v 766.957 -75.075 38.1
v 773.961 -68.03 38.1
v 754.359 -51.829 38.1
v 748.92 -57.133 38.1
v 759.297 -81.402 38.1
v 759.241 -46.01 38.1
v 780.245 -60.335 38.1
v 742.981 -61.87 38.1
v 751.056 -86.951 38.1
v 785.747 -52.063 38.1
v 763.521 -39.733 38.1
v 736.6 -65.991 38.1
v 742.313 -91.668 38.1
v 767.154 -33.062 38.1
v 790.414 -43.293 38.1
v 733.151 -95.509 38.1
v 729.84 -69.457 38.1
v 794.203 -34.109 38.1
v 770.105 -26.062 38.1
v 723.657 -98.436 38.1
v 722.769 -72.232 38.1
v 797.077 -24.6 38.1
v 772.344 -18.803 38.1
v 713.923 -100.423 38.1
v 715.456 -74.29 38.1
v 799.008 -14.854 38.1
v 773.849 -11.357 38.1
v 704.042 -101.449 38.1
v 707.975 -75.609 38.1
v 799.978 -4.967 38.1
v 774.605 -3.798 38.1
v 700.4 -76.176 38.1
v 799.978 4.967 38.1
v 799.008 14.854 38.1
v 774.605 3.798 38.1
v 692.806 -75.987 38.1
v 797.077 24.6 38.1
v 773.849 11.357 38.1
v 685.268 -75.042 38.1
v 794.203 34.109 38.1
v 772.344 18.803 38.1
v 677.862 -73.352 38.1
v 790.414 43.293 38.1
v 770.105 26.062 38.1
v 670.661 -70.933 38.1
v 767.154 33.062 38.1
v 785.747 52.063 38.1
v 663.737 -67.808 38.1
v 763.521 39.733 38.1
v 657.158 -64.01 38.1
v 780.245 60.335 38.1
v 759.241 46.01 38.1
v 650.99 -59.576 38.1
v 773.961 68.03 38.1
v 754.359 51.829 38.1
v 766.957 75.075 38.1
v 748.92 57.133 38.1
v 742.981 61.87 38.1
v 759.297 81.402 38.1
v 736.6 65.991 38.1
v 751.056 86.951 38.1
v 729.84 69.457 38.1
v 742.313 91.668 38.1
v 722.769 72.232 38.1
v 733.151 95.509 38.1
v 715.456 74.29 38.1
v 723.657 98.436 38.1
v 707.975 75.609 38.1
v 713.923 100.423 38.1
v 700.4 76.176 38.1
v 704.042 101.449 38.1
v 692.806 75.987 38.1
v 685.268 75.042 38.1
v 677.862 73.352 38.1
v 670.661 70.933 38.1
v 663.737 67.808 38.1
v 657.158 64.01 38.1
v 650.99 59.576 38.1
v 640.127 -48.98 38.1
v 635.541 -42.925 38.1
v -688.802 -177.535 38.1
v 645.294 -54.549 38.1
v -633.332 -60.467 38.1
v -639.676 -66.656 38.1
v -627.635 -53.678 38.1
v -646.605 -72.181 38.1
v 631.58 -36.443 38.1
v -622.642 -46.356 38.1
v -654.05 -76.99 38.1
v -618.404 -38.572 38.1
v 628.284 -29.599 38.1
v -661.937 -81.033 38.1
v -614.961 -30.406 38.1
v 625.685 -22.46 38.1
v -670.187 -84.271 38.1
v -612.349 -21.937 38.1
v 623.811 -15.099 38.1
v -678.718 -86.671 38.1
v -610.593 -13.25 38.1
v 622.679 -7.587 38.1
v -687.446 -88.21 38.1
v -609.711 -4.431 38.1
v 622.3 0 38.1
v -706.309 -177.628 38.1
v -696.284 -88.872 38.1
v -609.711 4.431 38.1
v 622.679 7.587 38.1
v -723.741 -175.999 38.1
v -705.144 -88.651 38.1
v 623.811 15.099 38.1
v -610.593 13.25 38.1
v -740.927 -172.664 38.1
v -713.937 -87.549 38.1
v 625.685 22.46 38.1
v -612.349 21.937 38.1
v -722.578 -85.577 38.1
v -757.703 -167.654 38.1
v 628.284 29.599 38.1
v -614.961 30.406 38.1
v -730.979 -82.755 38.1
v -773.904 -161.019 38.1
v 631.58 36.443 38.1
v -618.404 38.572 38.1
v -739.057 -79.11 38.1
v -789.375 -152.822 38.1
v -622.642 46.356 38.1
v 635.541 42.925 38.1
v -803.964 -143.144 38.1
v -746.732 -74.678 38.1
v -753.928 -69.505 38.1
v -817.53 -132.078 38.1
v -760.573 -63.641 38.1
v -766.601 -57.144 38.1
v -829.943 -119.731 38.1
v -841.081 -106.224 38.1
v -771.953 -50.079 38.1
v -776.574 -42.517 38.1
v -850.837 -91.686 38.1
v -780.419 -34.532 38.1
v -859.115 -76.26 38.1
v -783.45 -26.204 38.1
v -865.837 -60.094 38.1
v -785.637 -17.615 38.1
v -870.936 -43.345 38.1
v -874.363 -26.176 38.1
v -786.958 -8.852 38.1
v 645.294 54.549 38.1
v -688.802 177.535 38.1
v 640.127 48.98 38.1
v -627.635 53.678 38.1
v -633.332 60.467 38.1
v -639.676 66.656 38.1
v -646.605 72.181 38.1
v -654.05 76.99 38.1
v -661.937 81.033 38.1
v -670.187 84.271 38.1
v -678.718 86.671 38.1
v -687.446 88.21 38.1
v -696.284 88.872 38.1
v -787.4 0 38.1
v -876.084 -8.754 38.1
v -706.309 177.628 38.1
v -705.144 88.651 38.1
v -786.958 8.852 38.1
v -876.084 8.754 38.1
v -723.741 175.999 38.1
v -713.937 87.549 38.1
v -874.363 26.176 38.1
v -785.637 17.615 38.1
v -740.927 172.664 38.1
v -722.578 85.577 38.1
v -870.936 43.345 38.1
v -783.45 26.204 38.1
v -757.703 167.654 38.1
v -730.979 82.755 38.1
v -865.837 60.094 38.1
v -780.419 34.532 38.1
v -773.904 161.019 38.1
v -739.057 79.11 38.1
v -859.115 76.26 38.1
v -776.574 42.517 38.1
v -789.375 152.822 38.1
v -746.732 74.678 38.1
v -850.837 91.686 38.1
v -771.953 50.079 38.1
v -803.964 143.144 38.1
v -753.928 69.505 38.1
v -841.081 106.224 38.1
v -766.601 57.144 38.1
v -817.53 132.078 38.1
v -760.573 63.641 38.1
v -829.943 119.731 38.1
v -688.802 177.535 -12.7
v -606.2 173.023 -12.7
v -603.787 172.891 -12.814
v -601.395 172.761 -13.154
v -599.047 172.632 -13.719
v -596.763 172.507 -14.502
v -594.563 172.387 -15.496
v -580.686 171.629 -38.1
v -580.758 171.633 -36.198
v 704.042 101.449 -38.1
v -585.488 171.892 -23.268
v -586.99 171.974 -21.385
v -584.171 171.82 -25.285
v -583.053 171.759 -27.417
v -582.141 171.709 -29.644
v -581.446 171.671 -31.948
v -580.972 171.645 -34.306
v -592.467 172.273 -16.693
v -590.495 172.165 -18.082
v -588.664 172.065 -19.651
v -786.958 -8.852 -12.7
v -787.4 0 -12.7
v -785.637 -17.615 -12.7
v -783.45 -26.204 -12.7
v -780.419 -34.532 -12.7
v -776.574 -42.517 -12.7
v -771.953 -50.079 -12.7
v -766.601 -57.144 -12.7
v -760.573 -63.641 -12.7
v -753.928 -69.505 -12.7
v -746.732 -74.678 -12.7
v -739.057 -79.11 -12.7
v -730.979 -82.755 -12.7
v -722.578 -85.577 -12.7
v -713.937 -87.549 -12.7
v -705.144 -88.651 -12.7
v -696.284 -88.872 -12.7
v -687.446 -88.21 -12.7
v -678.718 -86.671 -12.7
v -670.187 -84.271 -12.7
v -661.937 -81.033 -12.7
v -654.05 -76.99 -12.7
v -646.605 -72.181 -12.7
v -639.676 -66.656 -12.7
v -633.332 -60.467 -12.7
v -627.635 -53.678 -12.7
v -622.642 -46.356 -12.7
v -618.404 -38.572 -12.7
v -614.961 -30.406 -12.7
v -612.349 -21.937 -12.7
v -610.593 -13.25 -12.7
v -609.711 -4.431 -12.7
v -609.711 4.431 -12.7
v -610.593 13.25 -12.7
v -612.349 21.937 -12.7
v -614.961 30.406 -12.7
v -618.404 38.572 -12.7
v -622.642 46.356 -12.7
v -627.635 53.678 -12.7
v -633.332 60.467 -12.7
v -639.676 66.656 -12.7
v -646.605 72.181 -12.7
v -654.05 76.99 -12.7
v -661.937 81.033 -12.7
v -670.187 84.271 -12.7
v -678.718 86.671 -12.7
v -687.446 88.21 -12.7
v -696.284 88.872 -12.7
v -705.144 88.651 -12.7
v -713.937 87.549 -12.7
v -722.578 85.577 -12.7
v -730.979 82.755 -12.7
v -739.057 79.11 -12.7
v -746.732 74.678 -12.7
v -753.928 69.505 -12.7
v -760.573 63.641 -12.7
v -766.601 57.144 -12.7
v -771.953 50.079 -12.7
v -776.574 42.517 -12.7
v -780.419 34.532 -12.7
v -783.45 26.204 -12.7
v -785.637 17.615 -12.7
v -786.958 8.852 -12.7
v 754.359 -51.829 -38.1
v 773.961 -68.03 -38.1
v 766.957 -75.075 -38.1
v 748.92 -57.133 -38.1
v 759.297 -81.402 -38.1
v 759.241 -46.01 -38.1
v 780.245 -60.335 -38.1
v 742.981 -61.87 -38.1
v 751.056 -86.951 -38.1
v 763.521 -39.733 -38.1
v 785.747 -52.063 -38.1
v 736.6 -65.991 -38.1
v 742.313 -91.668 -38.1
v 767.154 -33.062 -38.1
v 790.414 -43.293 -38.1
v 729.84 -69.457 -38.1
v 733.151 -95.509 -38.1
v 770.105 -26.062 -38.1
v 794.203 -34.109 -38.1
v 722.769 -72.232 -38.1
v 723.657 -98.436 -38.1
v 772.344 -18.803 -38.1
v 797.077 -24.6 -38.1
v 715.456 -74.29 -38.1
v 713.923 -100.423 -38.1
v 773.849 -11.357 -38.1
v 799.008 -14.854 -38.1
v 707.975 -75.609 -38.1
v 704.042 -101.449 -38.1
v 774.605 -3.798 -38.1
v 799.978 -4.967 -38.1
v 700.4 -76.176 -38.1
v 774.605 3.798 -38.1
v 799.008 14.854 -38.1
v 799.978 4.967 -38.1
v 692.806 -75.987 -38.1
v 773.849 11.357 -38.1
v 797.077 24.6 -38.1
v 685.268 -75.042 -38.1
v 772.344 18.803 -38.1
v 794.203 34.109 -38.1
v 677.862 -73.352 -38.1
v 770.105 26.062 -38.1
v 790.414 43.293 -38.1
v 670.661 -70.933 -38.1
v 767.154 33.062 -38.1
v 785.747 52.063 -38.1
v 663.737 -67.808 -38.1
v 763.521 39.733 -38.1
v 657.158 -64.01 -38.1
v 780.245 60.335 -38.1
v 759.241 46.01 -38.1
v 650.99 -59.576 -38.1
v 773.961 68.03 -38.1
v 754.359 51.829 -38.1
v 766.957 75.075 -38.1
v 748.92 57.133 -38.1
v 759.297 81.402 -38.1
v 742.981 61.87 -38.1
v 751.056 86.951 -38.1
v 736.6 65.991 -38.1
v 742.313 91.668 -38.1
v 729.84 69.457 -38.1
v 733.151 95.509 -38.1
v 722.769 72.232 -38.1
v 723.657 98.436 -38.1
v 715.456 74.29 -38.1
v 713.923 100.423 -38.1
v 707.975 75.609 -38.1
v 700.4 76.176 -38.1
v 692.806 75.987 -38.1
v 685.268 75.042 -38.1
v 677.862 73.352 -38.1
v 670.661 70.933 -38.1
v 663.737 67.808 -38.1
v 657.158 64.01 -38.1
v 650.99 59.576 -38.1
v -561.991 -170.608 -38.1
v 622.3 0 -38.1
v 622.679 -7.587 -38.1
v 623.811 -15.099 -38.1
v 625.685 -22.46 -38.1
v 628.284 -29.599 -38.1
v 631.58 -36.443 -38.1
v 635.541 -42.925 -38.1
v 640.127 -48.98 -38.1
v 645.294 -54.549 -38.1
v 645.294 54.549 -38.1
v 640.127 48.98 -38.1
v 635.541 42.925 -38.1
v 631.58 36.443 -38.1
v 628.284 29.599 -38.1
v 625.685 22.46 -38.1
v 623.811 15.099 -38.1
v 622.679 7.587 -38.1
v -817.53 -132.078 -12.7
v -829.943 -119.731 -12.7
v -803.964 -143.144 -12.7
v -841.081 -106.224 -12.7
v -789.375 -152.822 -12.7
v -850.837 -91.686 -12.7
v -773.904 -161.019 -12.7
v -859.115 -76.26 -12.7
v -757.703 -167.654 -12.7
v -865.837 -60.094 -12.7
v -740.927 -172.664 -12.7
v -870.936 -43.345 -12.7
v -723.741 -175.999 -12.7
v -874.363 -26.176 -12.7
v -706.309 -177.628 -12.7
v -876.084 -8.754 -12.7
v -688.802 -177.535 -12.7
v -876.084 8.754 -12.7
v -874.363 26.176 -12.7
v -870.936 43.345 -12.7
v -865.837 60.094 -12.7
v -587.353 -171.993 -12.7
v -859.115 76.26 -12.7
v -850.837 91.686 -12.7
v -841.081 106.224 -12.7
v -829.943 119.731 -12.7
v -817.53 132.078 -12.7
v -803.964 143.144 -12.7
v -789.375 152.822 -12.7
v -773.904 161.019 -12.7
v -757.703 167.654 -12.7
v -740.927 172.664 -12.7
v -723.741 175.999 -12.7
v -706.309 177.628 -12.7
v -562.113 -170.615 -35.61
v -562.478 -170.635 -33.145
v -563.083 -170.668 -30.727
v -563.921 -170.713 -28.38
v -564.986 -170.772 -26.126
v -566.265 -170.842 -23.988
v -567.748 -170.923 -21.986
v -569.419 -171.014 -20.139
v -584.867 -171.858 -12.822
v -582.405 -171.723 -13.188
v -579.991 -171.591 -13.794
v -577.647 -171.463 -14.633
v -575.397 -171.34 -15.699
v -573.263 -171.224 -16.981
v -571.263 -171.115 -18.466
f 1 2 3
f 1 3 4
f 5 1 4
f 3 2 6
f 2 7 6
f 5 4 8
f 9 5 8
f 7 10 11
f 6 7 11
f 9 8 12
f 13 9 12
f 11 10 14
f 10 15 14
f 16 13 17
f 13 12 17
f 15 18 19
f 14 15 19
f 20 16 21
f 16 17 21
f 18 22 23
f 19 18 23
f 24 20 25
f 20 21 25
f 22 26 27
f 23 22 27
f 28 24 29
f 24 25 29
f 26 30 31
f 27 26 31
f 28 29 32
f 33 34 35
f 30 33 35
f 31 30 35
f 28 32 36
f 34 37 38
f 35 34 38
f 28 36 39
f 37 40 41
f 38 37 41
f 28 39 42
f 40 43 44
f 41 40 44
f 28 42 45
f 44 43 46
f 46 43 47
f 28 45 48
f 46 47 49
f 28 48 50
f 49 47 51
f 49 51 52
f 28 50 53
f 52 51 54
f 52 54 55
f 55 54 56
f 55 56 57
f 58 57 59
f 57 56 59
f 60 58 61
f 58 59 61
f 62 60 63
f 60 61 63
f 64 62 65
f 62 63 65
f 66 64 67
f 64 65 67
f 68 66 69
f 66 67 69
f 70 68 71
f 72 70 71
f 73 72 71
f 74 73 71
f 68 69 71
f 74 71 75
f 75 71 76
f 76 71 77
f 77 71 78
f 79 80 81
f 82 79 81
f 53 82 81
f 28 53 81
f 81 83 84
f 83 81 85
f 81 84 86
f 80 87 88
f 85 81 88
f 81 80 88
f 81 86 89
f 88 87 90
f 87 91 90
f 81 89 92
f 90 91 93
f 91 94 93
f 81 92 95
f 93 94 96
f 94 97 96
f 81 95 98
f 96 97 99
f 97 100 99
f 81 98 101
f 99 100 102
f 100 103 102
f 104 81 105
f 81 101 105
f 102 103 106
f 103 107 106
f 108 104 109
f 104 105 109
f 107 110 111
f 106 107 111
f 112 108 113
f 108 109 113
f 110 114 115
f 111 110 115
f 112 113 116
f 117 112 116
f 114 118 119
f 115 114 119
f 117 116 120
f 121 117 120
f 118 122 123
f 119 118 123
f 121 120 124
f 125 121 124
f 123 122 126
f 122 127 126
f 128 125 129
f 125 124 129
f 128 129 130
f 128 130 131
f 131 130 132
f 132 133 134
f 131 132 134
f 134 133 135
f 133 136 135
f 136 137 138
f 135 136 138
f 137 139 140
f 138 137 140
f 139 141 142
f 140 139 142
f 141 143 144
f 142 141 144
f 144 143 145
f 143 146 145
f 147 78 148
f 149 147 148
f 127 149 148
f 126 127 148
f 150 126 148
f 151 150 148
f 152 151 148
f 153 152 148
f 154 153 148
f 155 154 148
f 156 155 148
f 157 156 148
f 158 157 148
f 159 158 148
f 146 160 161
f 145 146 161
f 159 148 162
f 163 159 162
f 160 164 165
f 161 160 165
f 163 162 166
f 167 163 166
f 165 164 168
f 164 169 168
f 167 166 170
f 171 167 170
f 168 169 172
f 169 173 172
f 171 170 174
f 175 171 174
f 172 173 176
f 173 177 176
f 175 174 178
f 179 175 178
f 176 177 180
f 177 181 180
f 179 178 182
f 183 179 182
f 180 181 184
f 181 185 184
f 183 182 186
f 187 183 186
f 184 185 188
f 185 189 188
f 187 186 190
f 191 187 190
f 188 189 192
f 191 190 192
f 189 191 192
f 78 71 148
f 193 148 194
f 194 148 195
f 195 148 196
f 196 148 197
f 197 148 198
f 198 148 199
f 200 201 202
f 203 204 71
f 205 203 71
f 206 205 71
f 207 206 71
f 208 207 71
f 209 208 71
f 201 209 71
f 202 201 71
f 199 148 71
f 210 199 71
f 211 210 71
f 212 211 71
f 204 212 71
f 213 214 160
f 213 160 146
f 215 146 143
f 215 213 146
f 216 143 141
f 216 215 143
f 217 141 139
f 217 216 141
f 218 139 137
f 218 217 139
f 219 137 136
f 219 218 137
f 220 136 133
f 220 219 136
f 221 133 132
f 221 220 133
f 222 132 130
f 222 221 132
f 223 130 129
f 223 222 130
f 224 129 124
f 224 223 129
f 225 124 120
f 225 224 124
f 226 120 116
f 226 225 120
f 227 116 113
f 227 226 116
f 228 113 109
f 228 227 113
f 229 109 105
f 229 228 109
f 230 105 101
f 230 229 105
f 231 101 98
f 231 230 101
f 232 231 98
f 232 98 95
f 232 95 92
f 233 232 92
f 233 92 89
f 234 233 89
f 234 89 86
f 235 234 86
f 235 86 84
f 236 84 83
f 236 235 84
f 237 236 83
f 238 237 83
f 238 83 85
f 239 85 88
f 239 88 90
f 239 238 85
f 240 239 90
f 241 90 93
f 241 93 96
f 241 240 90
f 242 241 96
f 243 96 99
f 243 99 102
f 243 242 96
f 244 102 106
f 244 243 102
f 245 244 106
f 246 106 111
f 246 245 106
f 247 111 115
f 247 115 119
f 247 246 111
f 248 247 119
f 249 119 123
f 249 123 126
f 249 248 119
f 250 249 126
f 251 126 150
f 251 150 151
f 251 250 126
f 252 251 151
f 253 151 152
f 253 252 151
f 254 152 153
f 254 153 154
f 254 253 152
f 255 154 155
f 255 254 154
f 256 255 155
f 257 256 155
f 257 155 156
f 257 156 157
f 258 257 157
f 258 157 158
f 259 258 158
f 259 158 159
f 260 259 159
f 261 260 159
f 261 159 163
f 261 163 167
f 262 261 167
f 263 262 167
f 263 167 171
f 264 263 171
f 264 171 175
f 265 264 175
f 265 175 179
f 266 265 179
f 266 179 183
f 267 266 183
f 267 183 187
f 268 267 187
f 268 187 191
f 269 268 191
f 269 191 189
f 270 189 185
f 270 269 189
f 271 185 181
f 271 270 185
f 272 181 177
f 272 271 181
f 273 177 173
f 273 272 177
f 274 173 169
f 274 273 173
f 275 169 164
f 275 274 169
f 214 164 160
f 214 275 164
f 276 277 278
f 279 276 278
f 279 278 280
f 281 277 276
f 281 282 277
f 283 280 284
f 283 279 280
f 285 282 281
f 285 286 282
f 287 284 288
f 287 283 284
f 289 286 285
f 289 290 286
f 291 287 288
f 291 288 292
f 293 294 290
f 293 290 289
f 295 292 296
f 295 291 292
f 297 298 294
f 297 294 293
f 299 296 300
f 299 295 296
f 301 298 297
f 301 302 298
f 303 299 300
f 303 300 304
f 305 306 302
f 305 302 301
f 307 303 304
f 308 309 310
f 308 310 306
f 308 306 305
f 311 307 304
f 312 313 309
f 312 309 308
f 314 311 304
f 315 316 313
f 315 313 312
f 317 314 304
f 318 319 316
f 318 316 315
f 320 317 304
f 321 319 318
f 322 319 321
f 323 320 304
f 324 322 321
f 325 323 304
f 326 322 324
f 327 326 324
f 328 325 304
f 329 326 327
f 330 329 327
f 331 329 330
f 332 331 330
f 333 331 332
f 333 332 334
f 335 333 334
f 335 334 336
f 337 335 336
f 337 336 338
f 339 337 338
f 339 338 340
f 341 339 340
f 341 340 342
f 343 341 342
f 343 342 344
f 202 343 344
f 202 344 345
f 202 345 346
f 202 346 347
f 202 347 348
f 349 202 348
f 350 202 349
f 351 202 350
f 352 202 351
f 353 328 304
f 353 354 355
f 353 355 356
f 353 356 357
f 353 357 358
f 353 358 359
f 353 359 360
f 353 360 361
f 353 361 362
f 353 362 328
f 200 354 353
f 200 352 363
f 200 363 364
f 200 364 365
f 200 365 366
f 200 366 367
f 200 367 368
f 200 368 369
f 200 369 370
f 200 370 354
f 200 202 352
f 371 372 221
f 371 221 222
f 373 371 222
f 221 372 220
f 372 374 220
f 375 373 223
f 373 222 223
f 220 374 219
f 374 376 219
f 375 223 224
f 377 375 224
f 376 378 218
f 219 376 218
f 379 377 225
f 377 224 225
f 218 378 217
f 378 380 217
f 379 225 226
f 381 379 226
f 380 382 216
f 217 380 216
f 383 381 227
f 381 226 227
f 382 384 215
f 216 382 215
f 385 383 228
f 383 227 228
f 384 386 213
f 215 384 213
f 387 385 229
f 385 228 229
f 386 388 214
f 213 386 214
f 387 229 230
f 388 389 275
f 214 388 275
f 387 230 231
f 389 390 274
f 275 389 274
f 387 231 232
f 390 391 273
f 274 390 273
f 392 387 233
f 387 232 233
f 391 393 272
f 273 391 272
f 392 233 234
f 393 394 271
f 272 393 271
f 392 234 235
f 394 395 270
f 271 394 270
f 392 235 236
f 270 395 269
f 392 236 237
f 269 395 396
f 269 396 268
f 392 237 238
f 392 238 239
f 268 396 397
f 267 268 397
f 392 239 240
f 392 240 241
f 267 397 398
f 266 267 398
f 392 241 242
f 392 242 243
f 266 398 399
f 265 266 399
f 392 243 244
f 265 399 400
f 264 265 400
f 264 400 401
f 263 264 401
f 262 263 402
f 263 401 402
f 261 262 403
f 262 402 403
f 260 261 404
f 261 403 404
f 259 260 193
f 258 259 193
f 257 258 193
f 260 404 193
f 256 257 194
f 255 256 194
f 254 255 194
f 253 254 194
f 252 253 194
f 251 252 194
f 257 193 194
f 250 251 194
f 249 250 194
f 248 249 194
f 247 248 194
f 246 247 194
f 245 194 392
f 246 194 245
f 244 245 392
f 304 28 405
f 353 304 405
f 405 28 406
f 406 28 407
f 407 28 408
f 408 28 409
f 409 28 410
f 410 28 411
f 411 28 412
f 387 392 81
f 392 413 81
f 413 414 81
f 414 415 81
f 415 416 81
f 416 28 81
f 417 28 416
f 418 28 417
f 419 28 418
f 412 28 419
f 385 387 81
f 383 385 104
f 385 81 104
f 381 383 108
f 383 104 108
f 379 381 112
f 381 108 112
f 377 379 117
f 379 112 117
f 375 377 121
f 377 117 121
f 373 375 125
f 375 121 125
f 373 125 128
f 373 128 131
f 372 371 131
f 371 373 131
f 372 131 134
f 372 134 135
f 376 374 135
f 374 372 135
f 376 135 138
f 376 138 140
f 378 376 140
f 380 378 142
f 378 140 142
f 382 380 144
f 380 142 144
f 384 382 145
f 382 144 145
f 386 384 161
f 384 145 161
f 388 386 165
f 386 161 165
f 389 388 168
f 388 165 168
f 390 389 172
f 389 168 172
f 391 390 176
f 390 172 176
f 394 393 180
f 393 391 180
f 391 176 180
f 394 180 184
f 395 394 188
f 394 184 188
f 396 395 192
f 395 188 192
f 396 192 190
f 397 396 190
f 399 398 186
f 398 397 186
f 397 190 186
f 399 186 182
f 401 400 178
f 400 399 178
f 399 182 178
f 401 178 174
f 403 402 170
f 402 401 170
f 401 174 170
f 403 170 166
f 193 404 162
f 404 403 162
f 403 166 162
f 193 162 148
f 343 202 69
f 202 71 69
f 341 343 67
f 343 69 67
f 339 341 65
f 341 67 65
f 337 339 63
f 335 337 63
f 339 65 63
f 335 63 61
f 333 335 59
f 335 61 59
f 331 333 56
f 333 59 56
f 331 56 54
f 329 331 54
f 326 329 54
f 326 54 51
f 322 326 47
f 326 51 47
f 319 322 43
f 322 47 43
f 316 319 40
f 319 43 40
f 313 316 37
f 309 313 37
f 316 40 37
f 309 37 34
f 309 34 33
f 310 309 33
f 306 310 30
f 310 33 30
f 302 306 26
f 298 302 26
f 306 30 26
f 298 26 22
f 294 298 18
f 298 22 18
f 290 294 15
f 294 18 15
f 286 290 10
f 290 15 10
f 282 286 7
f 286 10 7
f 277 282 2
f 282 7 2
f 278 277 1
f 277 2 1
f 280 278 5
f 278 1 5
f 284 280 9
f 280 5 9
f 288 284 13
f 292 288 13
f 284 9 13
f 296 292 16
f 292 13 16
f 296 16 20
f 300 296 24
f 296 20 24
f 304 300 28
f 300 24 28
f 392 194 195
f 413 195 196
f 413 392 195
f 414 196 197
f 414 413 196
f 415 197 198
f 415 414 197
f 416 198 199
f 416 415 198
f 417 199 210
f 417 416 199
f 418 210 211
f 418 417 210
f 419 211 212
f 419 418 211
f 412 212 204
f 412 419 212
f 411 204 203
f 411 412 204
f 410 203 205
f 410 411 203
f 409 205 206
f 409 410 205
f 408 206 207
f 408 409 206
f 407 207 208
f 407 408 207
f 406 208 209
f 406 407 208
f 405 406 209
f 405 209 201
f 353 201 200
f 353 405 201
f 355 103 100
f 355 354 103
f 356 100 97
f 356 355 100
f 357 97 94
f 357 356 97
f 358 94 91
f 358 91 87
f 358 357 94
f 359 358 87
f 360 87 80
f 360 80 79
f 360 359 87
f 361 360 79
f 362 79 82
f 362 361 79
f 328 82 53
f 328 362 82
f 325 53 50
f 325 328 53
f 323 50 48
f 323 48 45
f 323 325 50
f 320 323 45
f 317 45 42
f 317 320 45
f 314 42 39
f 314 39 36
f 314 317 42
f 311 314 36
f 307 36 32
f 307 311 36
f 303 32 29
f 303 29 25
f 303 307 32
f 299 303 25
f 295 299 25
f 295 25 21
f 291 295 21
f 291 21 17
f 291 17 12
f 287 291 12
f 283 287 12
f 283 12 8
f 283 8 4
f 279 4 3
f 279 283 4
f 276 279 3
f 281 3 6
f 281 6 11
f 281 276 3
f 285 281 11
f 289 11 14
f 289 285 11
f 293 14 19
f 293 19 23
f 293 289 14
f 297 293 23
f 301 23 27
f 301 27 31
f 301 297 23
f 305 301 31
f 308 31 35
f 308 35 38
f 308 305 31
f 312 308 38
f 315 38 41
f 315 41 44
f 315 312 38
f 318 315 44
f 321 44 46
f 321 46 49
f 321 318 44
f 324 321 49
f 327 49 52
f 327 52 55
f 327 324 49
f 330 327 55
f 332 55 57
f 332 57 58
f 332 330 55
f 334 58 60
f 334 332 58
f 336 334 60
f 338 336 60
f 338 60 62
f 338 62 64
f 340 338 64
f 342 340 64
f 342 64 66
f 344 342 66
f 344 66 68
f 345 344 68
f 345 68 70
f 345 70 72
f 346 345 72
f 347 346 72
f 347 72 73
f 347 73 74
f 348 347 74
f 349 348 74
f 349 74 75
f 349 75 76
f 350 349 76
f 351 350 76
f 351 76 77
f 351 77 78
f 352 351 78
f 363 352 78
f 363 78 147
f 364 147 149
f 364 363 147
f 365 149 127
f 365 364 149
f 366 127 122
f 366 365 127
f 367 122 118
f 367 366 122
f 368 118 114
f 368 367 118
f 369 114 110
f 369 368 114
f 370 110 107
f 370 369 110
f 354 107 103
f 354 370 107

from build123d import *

# Parameters (mm, degrees)
SKETCH1_R               = 88.9
SKETCH1_R_2             = 76.2
BOSS_EXTRUDE1_DEPTH     = 38.1
CUT_EXTRUDE1_DEPTH      = 940.915106169
CUT_EXTRUDE1_DEPTH_BACK = 940.915106169
SKETCH2_W               = 304.8
SKETCH2_H               = 25.4
FILLET1_R               = 25.4


with BuildPart() as part:
    # Sketch1 → Boss-Extrude1 (new, symmetric)
    with BuildSketch(Plane.XY):
        with BuildLine():
            Line((-688.801818182, 177.535307107), (704.041818182, 101.448746918))
            ThreePointArc((704.041818182, 101.448746918), (800.1, 0), (704.041818182, -101.448746918))
            Line((704.041818182, -101.448746918), (-688.801818182, -177.535307107))
            ThreePointArc((-688.801818182, -177.535307107), (-876.3, 0), (-688.801818182, 177.535307107))
        make_face()
        with Locations(Location((-698.5, 0, 0), (0, 0, 180))):
            Circle(SKETCH1_R, mode=Mode.SUBTRACT)
        with Locations(Location((698.5, 0, 0), (0, 0, 180))):
            Circle(SKETCH1_R_2, mode=Mode.SUBTRACT)
    extrude(amount=BOSS_EXTRUDE1_DEPTH, both=True)

    # Sketch2 → Cut-Extrude1 (cut, two sides: drawn at the far end of the back side and taken through both)
    with BuildSketch(Plane(origin=(7.62, -139.492027012, 0), x_dir=(0.998511288563344, 0.054545454545454695, 0), z_dir=(0.054545454545454695, -0.998511288563344, 0)).offset(-CUT_EXTRUDE1_DEPTH_BACK)):
        with Locations((-722.860135061, -25.4)):
            Rectangle(SKETCH2_W, SKETCH2_H)
    extrude(amount=CUT_EXTRUDE1_DEPTH + CUT_EXTRUDE1_DEPTH_BACK, mode=Mode.SUBTRACT)

    # Fillet1
    fillet1_edges = [part.edges().sort_by_distance(p)[0] for p in [
        (-571.338545978, 0.510632627, -12.7),
    ]]
    fillet(fillet1_edges, radius=FILLET1_R - 0.0001)  # a hair under: the kernel refuses the full size


solid = part.part
